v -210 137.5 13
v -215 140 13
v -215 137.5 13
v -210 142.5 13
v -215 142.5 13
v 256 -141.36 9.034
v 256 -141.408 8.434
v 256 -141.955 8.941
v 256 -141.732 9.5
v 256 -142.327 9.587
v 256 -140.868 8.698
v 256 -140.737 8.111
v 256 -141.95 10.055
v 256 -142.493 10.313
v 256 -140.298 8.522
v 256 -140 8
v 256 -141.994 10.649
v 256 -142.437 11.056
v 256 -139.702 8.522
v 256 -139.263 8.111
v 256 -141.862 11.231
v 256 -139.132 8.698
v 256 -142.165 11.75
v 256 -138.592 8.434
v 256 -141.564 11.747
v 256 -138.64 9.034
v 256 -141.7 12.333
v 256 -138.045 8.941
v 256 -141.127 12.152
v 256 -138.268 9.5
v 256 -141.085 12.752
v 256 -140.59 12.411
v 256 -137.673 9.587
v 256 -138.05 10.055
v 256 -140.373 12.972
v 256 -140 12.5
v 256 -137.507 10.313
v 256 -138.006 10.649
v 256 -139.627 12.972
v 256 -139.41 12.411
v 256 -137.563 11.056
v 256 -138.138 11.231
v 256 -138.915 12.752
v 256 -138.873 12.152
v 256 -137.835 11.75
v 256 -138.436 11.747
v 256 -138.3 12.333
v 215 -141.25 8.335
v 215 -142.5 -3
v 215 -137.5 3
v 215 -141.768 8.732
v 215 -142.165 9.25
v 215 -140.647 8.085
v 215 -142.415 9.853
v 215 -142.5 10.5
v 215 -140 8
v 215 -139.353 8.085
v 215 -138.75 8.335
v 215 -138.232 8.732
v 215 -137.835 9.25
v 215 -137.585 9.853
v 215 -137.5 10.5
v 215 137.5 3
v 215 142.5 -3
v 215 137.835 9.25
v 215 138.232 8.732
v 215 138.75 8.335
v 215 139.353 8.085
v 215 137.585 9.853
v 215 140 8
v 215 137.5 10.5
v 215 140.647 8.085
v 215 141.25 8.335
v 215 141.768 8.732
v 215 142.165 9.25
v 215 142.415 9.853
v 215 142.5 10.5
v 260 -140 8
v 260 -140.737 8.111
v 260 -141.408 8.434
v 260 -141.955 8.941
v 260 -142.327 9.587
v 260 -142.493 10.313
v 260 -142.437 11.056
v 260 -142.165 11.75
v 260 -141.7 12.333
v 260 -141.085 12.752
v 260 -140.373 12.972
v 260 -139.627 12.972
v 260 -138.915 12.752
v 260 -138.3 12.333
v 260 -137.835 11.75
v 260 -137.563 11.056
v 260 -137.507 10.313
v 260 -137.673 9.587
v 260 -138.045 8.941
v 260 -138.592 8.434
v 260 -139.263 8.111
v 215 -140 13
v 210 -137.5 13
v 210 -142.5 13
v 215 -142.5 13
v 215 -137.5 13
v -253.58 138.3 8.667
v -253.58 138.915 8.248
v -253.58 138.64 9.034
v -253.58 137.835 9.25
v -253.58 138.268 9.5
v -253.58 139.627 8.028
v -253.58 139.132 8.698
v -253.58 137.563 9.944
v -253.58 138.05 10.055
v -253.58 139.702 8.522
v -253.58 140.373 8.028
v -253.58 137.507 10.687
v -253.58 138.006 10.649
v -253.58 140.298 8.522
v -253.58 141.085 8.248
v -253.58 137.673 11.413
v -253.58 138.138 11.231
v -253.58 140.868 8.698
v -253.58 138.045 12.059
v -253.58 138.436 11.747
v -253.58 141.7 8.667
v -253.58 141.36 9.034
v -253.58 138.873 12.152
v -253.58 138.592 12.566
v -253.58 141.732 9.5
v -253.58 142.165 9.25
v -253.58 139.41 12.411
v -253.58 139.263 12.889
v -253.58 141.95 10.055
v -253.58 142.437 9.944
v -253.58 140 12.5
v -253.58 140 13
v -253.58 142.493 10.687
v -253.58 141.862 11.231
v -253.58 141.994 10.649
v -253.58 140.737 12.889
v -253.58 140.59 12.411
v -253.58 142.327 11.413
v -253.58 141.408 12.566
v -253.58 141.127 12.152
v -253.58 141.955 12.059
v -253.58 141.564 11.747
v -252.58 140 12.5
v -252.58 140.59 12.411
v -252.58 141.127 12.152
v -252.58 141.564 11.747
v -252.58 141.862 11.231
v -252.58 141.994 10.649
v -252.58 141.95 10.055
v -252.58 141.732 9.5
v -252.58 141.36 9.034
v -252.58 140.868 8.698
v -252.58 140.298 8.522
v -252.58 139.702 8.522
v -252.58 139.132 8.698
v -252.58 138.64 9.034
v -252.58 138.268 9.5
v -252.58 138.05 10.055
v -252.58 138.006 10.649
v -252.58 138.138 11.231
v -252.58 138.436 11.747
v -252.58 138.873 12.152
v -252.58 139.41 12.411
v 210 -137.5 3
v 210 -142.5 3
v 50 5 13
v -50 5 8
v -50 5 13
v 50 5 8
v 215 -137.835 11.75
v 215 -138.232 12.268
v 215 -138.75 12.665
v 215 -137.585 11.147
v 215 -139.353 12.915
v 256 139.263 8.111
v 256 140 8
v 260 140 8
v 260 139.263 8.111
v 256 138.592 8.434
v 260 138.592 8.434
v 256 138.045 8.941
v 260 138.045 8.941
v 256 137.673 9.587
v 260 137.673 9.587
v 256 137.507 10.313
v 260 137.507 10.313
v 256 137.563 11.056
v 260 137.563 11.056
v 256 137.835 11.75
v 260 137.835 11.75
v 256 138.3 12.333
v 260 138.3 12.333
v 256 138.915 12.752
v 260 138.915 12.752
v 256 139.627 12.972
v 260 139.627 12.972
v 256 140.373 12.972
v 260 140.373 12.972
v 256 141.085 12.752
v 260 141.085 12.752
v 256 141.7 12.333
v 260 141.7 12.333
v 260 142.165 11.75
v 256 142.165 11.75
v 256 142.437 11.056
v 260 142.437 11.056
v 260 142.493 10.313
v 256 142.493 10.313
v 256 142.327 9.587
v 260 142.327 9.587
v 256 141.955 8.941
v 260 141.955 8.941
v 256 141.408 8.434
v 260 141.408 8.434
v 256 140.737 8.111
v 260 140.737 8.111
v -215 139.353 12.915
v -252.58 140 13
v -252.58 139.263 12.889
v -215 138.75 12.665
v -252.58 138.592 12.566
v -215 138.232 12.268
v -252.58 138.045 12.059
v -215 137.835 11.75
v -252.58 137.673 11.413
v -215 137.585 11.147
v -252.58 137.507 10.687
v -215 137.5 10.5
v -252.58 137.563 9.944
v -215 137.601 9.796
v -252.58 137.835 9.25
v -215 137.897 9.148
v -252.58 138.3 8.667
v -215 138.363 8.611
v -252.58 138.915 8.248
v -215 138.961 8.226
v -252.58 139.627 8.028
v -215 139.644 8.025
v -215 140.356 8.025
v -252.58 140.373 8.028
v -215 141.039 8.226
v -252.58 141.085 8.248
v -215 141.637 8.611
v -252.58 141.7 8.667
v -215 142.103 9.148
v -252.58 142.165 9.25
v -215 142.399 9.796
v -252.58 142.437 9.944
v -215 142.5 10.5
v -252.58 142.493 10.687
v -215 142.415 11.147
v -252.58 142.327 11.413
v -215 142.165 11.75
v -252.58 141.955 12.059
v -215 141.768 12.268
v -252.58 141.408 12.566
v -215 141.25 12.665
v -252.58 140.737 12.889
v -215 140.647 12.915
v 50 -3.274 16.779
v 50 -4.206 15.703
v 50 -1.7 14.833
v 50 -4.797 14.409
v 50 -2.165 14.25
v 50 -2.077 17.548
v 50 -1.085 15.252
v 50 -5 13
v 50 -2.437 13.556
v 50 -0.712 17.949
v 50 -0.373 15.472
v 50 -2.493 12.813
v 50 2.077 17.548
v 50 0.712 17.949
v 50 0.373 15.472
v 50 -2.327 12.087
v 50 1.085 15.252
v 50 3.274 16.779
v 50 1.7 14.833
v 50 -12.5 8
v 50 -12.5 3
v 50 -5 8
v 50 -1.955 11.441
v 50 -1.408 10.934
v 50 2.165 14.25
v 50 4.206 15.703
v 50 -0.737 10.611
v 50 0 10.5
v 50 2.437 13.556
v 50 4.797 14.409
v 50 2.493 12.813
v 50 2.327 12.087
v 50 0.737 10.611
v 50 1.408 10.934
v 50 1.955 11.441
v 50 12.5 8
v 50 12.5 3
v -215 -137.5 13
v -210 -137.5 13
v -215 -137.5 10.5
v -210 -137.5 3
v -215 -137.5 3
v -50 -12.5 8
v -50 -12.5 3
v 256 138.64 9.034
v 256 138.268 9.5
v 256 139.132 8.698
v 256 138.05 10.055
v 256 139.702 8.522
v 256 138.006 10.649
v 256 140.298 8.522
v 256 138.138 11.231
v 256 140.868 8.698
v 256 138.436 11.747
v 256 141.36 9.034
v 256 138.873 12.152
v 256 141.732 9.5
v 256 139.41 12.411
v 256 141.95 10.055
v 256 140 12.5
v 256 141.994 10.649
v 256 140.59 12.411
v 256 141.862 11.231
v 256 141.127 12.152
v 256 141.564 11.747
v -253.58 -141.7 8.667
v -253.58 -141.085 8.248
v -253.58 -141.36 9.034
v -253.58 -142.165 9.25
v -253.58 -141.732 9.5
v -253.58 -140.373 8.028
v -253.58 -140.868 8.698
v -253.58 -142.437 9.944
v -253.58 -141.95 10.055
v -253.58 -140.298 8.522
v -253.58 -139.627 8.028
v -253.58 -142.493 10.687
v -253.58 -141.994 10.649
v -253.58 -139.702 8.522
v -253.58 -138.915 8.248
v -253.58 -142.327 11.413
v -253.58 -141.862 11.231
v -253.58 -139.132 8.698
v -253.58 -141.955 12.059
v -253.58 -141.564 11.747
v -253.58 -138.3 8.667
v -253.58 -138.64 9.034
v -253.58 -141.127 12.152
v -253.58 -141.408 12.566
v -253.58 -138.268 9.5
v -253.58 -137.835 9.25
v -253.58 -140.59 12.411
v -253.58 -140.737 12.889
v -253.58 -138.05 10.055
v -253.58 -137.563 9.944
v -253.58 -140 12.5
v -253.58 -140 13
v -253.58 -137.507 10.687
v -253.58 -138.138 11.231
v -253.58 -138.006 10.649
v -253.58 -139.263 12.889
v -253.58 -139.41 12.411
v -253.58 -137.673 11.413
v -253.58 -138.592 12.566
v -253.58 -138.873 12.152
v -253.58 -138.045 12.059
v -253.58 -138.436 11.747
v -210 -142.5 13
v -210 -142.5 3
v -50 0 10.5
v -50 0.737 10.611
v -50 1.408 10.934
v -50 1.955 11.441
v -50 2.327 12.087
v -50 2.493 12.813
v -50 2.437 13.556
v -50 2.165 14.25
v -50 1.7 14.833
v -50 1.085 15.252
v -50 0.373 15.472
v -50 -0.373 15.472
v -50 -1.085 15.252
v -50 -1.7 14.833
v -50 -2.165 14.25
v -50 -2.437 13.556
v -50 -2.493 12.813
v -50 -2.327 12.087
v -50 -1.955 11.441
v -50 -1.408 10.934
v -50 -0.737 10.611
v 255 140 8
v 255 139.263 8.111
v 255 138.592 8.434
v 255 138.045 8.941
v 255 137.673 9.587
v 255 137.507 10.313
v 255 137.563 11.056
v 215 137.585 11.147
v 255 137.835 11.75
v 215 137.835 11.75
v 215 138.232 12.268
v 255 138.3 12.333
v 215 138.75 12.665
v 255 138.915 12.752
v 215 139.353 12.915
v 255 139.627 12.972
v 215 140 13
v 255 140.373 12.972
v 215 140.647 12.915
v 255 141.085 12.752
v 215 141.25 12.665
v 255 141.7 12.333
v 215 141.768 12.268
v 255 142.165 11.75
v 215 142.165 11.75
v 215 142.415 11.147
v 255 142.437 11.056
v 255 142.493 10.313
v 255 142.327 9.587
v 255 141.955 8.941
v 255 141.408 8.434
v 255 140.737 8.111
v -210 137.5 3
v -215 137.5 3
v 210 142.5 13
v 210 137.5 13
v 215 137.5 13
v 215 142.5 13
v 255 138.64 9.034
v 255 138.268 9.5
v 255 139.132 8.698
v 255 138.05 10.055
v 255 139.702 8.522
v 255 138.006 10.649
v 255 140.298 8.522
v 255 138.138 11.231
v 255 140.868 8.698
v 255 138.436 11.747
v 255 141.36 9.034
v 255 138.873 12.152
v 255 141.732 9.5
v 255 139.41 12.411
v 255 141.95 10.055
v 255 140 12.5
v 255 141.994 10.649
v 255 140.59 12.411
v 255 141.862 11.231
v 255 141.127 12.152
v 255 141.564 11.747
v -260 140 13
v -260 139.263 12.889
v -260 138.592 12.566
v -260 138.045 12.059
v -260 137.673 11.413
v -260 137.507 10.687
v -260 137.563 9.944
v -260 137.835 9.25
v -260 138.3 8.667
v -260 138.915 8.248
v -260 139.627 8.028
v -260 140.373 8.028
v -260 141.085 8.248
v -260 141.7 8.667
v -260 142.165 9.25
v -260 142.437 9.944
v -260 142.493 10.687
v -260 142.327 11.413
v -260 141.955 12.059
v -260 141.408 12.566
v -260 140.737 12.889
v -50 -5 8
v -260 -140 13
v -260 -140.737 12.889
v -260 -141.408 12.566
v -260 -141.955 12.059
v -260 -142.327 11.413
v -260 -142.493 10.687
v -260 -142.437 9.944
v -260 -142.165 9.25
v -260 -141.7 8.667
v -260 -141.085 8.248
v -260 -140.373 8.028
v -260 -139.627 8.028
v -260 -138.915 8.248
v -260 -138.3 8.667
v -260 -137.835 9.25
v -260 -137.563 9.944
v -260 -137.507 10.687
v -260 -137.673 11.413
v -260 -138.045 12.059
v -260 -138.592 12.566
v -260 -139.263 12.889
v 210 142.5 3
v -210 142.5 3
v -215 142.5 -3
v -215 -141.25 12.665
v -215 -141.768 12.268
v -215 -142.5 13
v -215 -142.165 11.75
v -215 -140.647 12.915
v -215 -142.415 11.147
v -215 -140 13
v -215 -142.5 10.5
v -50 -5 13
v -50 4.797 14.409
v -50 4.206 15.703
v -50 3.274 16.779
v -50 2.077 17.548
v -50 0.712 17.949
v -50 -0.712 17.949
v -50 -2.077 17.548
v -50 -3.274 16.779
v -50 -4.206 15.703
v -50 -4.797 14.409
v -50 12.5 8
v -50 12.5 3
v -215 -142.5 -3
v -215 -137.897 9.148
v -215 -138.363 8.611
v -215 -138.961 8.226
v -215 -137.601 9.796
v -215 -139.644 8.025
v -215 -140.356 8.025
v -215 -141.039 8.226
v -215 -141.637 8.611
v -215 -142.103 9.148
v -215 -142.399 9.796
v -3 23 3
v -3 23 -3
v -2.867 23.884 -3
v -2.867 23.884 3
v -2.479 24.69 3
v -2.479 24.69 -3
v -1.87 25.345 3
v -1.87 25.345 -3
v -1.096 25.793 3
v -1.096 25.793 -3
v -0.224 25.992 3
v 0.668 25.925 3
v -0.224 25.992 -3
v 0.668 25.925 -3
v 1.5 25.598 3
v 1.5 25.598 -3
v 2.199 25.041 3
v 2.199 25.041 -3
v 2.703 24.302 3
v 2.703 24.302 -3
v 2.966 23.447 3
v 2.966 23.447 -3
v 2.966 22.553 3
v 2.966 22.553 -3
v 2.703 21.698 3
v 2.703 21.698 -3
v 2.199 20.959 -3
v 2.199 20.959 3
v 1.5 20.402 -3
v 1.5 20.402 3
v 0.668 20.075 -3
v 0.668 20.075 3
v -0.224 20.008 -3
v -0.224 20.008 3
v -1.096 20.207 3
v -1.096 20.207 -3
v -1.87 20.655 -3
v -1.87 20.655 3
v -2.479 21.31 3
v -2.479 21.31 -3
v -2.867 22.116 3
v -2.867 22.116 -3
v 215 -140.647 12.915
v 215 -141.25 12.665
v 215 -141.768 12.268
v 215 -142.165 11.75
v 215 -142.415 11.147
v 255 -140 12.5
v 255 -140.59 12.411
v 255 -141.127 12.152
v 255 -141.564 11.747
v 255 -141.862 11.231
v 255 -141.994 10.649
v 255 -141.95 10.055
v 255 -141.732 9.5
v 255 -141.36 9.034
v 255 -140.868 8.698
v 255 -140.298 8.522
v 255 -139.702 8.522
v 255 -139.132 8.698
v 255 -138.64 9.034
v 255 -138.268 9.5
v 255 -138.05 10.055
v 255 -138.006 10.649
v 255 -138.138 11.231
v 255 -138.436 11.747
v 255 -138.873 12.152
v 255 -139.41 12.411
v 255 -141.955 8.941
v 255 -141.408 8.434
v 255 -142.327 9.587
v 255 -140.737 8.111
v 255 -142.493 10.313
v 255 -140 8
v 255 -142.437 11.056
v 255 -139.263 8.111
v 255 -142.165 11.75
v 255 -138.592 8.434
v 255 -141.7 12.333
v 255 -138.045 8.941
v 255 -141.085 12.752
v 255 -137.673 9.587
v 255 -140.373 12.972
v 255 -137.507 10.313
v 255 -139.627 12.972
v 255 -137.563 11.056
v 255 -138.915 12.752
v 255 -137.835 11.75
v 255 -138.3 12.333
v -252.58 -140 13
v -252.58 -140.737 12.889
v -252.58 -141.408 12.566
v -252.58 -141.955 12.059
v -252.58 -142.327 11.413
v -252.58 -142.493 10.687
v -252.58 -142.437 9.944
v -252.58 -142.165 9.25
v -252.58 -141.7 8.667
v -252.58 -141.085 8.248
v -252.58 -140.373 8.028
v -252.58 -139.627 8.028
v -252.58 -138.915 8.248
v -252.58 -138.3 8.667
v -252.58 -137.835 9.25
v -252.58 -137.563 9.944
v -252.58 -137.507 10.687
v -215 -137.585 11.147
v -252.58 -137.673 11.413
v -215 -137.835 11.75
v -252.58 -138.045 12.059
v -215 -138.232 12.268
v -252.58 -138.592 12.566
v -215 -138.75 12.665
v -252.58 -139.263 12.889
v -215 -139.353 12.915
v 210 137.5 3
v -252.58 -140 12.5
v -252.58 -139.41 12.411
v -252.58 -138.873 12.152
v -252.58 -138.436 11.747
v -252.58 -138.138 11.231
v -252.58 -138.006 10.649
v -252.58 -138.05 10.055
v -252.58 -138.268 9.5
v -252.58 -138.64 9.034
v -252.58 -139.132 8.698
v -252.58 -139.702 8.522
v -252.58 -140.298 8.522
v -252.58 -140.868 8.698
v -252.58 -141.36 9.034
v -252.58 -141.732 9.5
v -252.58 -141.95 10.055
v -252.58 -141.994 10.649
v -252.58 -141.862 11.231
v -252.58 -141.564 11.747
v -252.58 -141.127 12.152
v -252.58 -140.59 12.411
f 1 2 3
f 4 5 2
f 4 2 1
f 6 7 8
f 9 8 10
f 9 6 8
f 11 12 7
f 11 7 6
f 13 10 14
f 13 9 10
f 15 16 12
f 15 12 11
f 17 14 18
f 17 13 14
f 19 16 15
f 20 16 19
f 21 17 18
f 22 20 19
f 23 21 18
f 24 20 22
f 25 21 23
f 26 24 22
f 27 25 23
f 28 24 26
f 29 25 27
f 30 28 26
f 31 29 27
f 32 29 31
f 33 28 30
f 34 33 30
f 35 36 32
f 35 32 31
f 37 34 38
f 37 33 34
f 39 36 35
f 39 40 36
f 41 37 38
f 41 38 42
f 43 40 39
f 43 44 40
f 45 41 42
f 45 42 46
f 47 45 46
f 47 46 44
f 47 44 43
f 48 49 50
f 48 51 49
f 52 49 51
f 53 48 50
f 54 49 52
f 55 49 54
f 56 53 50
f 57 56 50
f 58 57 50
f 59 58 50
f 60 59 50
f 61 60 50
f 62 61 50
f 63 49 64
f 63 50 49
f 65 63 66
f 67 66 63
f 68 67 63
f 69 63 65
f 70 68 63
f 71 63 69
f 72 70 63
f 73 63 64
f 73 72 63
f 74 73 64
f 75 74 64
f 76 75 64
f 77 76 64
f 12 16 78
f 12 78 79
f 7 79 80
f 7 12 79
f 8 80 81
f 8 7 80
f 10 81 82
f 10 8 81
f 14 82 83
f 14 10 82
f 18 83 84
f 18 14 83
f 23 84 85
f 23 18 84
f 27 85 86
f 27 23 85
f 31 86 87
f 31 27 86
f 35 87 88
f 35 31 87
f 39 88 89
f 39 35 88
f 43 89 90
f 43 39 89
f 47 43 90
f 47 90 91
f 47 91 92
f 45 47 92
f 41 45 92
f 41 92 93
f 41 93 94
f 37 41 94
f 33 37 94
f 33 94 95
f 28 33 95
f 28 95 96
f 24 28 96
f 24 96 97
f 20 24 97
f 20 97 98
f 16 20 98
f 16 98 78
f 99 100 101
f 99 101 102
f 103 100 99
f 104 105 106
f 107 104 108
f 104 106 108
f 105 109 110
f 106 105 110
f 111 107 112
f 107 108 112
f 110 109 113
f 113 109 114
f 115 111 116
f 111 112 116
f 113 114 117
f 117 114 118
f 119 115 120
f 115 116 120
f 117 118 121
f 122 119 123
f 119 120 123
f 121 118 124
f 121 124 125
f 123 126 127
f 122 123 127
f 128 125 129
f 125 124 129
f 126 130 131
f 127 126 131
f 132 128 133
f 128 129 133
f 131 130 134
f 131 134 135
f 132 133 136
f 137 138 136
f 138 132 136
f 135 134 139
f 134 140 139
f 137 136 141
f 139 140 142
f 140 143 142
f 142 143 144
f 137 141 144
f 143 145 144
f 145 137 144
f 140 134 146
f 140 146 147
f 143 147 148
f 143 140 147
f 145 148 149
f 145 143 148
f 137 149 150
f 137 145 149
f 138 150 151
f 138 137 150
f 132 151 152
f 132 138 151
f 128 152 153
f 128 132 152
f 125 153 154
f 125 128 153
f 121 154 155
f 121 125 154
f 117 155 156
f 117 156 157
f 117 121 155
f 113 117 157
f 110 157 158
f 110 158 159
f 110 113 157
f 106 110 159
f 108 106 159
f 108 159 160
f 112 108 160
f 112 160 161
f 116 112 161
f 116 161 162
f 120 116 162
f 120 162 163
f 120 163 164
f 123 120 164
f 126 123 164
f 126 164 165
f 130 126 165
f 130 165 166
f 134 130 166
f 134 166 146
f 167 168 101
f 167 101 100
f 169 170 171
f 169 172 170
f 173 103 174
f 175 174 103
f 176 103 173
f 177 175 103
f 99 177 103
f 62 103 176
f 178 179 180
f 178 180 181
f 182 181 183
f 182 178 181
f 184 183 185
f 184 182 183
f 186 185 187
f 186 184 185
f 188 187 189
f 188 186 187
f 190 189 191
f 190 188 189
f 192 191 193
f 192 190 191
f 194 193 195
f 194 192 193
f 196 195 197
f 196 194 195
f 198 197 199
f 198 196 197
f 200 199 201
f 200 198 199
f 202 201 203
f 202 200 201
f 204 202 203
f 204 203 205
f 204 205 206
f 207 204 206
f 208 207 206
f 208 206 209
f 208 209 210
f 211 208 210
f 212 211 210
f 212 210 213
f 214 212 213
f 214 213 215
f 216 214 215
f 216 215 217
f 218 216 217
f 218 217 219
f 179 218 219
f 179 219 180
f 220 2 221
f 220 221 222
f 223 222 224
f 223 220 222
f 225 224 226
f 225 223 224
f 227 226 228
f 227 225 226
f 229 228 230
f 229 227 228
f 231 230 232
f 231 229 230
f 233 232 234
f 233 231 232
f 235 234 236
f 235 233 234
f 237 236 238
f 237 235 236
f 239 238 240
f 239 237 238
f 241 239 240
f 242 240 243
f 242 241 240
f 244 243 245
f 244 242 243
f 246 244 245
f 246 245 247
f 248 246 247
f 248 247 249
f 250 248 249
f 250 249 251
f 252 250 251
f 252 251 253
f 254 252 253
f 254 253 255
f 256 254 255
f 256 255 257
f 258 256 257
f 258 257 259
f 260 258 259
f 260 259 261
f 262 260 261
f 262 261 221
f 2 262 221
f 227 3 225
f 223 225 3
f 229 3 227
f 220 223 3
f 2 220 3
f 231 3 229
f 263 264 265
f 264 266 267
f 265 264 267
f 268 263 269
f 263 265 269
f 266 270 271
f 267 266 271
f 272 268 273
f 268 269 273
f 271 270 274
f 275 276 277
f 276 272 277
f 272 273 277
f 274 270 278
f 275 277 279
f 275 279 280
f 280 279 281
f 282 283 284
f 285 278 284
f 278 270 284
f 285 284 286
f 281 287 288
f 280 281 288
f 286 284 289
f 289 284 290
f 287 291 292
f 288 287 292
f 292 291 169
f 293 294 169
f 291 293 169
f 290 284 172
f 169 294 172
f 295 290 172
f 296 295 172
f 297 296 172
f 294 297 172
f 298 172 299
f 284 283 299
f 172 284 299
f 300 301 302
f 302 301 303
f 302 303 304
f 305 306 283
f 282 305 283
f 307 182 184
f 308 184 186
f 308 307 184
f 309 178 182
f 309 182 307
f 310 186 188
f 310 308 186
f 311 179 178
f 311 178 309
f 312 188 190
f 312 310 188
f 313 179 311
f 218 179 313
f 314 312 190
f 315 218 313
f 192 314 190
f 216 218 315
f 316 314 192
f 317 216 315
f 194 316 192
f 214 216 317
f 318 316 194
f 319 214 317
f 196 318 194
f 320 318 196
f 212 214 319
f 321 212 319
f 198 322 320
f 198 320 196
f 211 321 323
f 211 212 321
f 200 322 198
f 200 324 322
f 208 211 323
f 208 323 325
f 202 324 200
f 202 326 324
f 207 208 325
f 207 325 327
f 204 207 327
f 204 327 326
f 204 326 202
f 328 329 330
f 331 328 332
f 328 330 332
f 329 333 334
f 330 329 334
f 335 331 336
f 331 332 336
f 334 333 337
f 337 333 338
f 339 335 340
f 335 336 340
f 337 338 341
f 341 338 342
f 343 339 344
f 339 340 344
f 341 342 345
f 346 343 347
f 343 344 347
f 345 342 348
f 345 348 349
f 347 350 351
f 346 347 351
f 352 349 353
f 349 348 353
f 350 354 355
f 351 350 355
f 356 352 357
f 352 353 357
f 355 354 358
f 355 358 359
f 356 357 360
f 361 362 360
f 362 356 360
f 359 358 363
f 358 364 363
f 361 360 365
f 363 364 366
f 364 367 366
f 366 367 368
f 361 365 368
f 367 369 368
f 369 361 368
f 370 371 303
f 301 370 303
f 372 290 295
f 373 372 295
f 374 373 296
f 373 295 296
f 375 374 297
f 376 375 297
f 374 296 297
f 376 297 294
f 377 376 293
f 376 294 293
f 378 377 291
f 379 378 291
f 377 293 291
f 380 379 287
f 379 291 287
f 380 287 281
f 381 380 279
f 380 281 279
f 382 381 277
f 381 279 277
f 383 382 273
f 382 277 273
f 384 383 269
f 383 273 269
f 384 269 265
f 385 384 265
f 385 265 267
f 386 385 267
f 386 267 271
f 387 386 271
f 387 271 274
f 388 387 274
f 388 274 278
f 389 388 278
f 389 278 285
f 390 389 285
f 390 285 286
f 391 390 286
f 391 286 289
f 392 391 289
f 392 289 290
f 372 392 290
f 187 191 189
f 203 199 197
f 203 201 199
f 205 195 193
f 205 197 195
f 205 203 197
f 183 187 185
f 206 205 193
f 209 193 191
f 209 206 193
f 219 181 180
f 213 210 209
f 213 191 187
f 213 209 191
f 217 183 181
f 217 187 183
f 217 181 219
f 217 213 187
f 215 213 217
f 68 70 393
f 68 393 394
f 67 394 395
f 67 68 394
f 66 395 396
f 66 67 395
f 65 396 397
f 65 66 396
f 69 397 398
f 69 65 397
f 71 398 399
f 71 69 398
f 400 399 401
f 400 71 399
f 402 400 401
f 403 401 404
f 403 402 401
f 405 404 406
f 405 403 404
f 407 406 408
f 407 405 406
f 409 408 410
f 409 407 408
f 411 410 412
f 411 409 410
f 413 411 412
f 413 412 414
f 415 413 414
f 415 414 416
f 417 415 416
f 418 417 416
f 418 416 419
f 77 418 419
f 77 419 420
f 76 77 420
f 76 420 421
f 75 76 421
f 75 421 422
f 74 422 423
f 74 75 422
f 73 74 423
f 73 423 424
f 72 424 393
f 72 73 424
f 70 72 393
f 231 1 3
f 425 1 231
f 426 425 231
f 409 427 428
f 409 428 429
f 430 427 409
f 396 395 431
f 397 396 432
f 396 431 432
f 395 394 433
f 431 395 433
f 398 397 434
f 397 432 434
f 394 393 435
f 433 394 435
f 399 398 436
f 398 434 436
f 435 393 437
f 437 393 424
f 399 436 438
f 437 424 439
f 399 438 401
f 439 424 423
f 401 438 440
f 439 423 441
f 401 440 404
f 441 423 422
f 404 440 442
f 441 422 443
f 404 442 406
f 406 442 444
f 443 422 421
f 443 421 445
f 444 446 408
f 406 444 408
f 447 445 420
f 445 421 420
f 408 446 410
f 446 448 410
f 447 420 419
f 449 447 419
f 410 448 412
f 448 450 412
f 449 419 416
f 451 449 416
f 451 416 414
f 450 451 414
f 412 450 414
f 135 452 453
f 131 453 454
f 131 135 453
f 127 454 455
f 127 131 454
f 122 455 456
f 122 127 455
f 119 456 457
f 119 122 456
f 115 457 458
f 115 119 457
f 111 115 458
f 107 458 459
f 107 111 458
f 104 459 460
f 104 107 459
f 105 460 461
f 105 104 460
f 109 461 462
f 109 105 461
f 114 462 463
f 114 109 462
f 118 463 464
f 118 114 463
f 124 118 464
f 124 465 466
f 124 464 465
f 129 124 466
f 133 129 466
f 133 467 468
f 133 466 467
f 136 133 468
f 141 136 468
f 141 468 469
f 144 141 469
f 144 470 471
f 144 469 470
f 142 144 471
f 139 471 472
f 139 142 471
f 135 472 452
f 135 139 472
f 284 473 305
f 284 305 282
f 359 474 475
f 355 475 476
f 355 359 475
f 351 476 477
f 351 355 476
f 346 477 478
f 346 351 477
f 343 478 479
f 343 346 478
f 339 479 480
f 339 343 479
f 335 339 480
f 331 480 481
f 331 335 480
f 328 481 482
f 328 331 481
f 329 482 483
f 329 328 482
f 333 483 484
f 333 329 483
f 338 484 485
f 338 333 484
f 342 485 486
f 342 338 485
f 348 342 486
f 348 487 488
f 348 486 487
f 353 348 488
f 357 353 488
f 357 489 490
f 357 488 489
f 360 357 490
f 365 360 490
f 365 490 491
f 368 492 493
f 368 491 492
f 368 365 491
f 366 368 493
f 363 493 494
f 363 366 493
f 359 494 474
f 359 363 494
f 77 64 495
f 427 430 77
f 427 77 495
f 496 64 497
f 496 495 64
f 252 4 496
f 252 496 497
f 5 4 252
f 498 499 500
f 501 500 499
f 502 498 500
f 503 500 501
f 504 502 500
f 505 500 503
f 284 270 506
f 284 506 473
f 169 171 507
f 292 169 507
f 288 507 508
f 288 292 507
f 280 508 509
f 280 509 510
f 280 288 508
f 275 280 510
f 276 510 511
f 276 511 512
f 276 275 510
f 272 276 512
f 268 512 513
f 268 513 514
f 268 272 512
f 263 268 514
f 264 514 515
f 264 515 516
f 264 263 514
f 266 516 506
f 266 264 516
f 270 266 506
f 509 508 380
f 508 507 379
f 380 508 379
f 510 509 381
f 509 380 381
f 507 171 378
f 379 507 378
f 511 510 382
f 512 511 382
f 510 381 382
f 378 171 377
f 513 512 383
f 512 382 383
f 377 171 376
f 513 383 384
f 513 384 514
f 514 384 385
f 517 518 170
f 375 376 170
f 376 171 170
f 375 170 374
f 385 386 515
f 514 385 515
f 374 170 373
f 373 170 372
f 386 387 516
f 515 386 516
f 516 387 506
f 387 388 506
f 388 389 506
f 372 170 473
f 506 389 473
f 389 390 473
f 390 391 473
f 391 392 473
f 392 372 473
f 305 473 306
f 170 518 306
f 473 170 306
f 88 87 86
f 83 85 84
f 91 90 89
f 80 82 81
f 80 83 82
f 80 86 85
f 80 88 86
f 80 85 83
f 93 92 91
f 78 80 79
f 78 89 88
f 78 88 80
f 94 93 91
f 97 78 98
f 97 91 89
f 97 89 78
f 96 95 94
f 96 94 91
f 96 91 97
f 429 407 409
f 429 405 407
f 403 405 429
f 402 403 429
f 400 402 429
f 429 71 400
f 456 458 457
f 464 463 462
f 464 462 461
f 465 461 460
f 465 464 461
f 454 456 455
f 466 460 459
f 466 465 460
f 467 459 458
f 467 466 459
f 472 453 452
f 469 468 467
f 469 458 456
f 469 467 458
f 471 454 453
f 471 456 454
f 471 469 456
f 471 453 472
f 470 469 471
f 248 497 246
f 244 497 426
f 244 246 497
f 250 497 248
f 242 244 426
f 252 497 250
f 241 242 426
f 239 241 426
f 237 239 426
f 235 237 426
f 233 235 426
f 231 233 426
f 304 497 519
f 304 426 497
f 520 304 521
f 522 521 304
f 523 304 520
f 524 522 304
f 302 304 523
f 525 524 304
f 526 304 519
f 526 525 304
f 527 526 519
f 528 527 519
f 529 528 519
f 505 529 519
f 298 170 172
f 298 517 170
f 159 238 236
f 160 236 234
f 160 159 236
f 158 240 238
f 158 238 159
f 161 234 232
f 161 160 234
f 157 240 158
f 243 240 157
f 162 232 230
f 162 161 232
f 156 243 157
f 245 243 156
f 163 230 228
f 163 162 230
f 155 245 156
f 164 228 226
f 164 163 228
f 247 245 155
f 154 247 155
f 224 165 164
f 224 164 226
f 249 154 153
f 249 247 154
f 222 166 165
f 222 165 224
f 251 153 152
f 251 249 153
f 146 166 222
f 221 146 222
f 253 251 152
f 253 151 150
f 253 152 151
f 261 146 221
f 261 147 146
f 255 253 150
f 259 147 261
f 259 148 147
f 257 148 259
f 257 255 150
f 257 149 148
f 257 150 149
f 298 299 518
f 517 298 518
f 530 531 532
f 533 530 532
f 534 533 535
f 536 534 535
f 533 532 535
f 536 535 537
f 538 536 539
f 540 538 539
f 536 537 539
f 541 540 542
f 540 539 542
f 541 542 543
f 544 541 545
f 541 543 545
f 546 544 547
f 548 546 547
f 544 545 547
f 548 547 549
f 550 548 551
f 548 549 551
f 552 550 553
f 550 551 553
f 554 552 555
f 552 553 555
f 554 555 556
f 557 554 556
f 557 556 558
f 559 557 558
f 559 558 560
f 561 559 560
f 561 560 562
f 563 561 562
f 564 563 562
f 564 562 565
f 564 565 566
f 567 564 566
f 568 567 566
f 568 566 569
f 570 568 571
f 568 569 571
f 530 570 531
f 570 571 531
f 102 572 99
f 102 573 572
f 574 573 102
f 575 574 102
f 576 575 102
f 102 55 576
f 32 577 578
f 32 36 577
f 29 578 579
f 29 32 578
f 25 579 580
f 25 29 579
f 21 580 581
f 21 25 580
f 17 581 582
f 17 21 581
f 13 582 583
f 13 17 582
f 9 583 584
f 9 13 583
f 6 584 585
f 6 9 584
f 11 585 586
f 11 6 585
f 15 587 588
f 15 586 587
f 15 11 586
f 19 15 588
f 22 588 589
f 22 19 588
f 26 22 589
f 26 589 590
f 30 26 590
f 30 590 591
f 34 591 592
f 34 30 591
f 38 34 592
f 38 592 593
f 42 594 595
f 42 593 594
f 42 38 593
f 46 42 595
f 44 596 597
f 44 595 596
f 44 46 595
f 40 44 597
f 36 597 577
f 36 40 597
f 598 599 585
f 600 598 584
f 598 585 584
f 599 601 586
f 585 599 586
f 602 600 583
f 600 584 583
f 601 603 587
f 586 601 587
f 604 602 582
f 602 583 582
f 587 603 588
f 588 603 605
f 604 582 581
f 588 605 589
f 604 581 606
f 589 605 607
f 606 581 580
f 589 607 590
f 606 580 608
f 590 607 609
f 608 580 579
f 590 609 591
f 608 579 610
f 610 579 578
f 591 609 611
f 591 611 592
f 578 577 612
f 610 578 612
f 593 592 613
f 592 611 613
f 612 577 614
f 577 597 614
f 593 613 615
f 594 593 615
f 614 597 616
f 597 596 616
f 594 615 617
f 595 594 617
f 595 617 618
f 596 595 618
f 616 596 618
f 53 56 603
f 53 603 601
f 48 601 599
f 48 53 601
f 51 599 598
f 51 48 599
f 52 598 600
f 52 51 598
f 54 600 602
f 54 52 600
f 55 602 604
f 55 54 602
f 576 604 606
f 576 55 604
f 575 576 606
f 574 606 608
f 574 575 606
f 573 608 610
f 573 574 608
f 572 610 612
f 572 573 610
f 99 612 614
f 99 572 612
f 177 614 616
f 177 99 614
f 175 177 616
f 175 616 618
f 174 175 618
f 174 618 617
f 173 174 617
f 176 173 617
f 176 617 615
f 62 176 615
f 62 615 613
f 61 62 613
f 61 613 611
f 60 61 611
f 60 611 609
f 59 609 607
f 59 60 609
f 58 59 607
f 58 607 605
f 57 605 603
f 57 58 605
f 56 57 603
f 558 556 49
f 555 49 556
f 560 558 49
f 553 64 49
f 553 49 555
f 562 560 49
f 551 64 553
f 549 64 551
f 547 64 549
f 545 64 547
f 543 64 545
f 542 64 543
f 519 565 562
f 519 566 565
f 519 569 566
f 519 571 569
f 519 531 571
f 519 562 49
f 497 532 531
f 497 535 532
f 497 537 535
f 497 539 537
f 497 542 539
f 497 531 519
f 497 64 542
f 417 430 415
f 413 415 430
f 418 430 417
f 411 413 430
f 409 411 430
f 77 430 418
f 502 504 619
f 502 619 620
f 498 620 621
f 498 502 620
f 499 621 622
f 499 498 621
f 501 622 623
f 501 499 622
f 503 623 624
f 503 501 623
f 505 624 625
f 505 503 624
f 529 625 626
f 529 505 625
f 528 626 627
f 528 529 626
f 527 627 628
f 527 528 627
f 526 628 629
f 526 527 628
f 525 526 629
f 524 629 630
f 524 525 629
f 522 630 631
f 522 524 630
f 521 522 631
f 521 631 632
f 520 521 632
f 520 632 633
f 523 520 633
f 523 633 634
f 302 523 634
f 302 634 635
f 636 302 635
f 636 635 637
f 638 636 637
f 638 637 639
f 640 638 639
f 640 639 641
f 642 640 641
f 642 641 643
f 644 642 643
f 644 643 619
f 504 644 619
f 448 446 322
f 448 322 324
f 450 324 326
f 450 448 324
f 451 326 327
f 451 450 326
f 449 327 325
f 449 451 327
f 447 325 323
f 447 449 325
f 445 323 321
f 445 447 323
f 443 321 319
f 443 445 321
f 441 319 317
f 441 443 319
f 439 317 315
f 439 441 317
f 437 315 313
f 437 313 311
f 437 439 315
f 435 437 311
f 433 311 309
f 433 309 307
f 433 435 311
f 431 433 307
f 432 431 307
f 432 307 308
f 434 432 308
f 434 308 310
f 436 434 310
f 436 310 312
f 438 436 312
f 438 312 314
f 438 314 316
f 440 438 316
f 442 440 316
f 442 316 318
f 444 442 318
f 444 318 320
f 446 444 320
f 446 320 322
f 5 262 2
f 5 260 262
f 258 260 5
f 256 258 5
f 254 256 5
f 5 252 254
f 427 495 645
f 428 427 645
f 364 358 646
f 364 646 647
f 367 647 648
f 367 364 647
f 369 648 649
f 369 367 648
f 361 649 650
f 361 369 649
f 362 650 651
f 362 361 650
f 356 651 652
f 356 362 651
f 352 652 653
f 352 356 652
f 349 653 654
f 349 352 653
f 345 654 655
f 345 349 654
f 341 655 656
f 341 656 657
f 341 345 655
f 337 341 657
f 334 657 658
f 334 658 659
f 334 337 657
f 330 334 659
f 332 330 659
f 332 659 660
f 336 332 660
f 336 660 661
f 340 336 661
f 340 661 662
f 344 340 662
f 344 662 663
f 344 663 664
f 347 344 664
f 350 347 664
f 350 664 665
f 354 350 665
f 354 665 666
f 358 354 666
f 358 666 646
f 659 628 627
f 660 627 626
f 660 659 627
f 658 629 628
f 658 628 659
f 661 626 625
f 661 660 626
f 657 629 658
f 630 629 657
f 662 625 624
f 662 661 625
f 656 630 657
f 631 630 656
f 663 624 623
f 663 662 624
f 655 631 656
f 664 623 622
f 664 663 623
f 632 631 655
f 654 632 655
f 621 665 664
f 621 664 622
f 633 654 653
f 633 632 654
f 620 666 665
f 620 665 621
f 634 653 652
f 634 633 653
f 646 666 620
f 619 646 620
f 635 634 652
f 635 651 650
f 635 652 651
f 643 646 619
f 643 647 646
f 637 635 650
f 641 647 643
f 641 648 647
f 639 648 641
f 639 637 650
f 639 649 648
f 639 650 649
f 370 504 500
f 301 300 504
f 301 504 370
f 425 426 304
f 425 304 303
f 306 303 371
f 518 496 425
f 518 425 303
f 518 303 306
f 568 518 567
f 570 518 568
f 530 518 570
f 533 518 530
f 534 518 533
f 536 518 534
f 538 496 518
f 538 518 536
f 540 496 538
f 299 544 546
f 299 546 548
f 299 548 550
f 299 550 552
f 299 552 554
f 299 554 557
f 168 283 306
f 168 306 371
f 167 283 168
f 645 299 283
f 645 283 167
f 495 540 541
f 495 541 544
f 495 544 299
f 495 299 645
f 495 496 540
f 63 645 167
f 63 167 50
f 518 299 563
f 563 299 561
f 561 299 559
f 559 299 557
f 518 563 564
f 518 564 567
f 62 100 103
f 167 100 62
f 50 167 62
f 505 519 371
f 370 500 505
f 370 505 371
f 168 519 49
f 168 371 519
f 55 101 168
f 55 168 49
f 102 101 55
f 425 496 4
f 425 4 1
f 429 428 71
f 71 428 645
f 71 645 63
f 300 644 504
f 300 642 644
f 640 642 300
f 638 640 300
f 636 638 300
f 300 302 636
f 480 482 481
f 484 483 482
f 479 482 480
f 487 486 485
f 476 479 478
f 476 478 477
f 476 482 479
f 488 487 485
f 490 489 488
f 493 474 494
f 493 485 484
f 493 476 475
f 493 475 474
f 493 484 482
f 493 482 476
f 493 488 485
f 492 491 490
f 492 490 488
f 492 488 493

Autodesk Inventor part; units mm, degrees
ref_plane "YZ Plane" through (0, 0, 0) normal (1, 0, 0) x (0, 1, 0)
ref_plane "XZ Plane" through (0, 0, 0) normal (0, 1, 0) x (-1, 0, 0)
sketch "Boceto1" plane through (0, 0, 0) normal (0, 0, 1) x (1, 0, 0)
  line L0 (-215, 142.5) -> (215, 142.5)
  line L1 (215, 142.5) -> (215, -142.5)
  line L2 (215, -142.5) -> (-215, -142.5)
  line L3 (-215, -142.5) -> (-215, 142.5)
  line L4 (-215, 142.5) -> (215, -142.5) construction
  line L5 (215, 142.5) -> (-215, -142.5) construction
  point P0 (0, 0)
  dimension "d0" = 430
  dimension "d1" = 285
extrude "Extrusión1" add sketch "Boceto1" along normal blind 3
sketch "Boceto2" plane through (0, 0, 3) normal (0, 0, 1) x (1, 0, 0)
  line L0 (-50, -12.5) -> (50, -12.5)
  line L1 (50, -12.5) -> (50, 12.5)
  line L2 (50, 12.5) -> (-50, 12.5)
  line L3 (-50, 12.5) -> (-50, -12.5)
  line L4 (-50, -12.5) -> (50, 12.5) construction
  line L5 (50, -12.5) -> (-50, 12.5) construction
  point P0 (0, 0)
  dimension "d4" = 100
  dimension "d5" = 25
extrude "Extrusión2" add sketch "Boceto2" along normal blind 5
sketch "Boceto3" plane through (50, -12.5, 3) normal (1, 0, 0) x (0, 0, -1)
  line L0 (-5, 0) -> (-5, 12.5)
  arc A0 (-10, 17.5) -> (-10, 7.5) centre (-10, 12.5) ccw
  circle A1 centre (-10, 12.5) radius 2.5
  line L1 (-5, 0) -> (-5, 25) projected
  line L2 (-10, 7.5) -> (-5, 7.5)
  line L3 (-5, 7.5) -> (-5, 17.5)
  line L4 (-5, 17.5) -> (-10, 17.5)
  point P0 (3, 12.5)
  dimension "d10" = 5
extrude "Extrusión3" add sketch "Boceto3" against normal blind 100
sketch "Boceto13" plane through (0, 0, 3) normal (0, 0, 1) x (1, 0, 0)
  line L0 (215, 142.5) -> (-215, 142.5) projected
  line L1 (-215, 142.5) -> (-210, 142.5)
  line L2 (-210, 142.5) -> (-210, 137.5)
  line L3 (-210, 137.5) -> (-215, 137.5)
  line L4 (-215, 137.5) -> (-215, 142.5)
  line L5 (215, -142.5) -> (215, 142.5) projected
  line L6 (215, 142.5) -> (210, 142.5)
  line L7 (210, 142.5) -> (210, 137.5)
  line L8 (210, 137.5) -> (215, 137.5)
  line L9 (215, 137.5) -> (215, 142.5)
  line L10 (-215, -142.5) -> (215, -142.5) projected
  line L11 (215, -142.5) -> (210, -142.5)
  line L12 (210, -142.5) -> (210, -137.5)
  line L13 (210, -137.5) -> (215, -137.5)
  line L14 (215, -137.5) -> (215, -142.5)
  line L15 (-215, -142.5) -> (-210, -142.5)
  line L16 (-210, -142.5) -> (-210, -137.5)
  line L17 (-210, -137.5) -> (-215, -137.5)
  line L18 (-215, -137.5) -> (-215, -142.5)
  point P0 (0, 0)
  dimension "d39" = 5
  dimension "d40" = 5
  dimension "d41" = 5
  dimension "d42" = 5
  dimension "d43" = 5
  dimension "d44" = 5
  dimension "d45" = 5
  dimension "d46" = 5
extrude "Extrusión10" add sketch "Boceto13" along normal blind 10
sketch "Boceto16" plane through (-215, -142.5, 0) normal (-1, 0, 0) x (0, 0, 1)
  line L0 (13, 5) -> (13, 0) projected
  circle A0 centre (10.5, 2.5) radius 2.5
  line L1 (13, 285) -> (13, 280) projected
  circle A1 centre (10.5, 282.5) radius 2.5
  point P0 (0, 142.5)
extrude "Extrusión13" add sketch "Boceto16" along normal blind 45
sketch "Boceto17" plane through (215, -142.5, 0) normal (1, 0, 0) x (0, 0, -1)
  line L0 (-13, 280) -> (-13, 285) projected
  circle A0 centre (-10.5, 282.5) radius 2.5
  line L1 (-13, 0) -> (-13, 5) projected
  circle A1 centre (-10.5, 2.5) radius 2.5
  point P0 (0, 142.5)
extrude "Extrusión14" add sketch "Boceto17" along normal blind 45
ref_plane "Plano de trabajo3" through (-215, 140, 0) normal (0, 1, 0) x (1, 0, 0)
sketch "Boceto18" plane through (-215, 140, 0) normal (0, 1, 0) x (1, 0, 0)
  line L0 (475, -13) -> (475, -8) projected
  line L1 (475, -10.5) -> (470.5, -10.5)
  line L2 (470.5, -10.5) -> (470.5, -13)
  line L3 (430, -13) -> (475, -13) projected
  line L4 (470, -13.5) -> (471, -13.5)
  line L5 (471, -13.5) -> (471, -12.5)
  line L6 (471, -12.5) -> (470, -12.5)
  line L7 (470, -12.5) -> (470, -13.5)
  line L8 (470, -13.5) -> (471, -12.5) construction
  line L9 (471, -13.5) -> (470, -12.5) construction
  line L10 (-45, -8) -> (-45, -13) projected
  line L11 (-45, -10.5) -> (-38.08, -10.5)
  line L12 (-38.08, -10.5) -> (-38.08, -13)
  line L13 (0, -13) -> (-45, -13) projected
  line L14 (-38.58, -13.5) -> (-37.58, -13.5)
  line L15 (-37.58, -13.5) -> (-37.58, -12.5)
  line L16 (-37.58, -12.5) -> (-38.58, -12.5)
  line L17 (-38.58, -12.5) -> (-38.58, -13.5)
  line L18 (-38.58, -13.5) -> (-37.58, -12.5) construction
  line L19 (-37.58, -13.5) -> (-38.58, -12.5) construction
  point P0 (215, 0)
  point P1 (470, -13)
  point P2 (471, -13)
  dimension "d68" = 4.5
  dimension "d69" = 1
  dimension "d70" = 1
  dimension "d72" = 6.92
  dimension "d73" = 1
  dimension "d74" = 1
revolve "Revolución1" cut sketch "Boceto18" angle 360 about axis through (260, 140, 10.5) along (-1, 0, 0) contours L3 L2 L6 L5 | L3 L7 L6 L2 | L17 L16 L12 L13 | L13 L15 L14 L17 | L16 L15 L13 L12
ref_plane "Plano de trabajo4" through (210, -140, 3) normal (0, 1, 0) x (1, 0, 0)
sketch "Boceto19" plane through (210, -140, 3) normal (0, 1, 0) x (1, 0, 0)
  line L0 (50, -10) -> (50, -5) projected
  line L1 (50, -7.5) -> (45.5, -7.5)
  line L2 (45.5, -7.5) -> (45.5, -10)
  line L3 (5, -10) -> (50, -10) projected
  line L4 (46, -10.5) -> (45, -10.5)
  line L5 (45, -10.5) -> (45, -9.5)
  line L6 (45, -9.5) -> (46, -9.5)
  line L7 (46, -9.5) -> (46, -10.5)
  line L8 (46, -10.5) -> (45, -9.5) construction
  line L9 (45, -10.5) -> (46, -9.5) construction
  line L10 (-470, -5) -> (-470, -10) projected
  line L11 (-470, -7.5) -> (-463.08, -7.5)
  line L12 (-463.08, -7.5) -> (-463.08, -10)
  line L13 (-462.58, -10) -> (-462.58, -5) projected
  line L14 (-463.58, -10.5) -> (-462.58, -10.5)
  line L15 (-462.58, -10.5) -> (-462.58, -9.5)
  line L16 (-462.58, -9.5) -> (-463.58, -9.5)
  line L17 (-463.58, -9.5) -> (-463.58, -10.5)
  line L18 (-463.58, -10.5) -> (-462.58, -9.5) construction
  line L19 (-462.58, -10.5) -> (-463.58, -9.5) construction
  point P0 (-210, 3)
  dimension "d76" = 4.5
  dimension "d77" = 1
  dimension "d78" = 1
  dimension "d79" = 6.92
  dimension "d80" = 1
revolve "Revolución2" cut sketch "Boceto19" angle 360 about axis through (260, -140, 10.5) along (-1, 0, 0) contours L7 L4 L5 L3 | L3 L2 L6 L7 | L3 L5 L6 L2 | L15 L14 L17 L16 L13
sketch "Sketch20" plane through (0, 0, 0) normal (0, 0, -1) x (-1, 0, 0)
  line L0 (215, 142.5) -> (215, -142.5) projected
  line L1 (215, -142.5) -> (-215, -142.5) projected
  line L2 (-215, 142.5) -> (215, 142.5) projected
  line L3 (-215, -142.5) -> (-215, 142.5) projected
  point P0 (0, 0)
extrude "Extrusion15" add sketch "Sketch20" along normal blind 3
sketch "Sketch22" plane through (0, 0, -3) normal (0, 0, -1) x (-1, 0, 0)
  line L0 (0, 0) -> (0, 23) construction
  circle A0 centre (0, 23) radius 3
  dimension "d84" = 23
  dimension "d85" = 6
extrude "Extrusion16" cut sketch "Sketch22" against normal blind 6
properties part number "Bandeja"
